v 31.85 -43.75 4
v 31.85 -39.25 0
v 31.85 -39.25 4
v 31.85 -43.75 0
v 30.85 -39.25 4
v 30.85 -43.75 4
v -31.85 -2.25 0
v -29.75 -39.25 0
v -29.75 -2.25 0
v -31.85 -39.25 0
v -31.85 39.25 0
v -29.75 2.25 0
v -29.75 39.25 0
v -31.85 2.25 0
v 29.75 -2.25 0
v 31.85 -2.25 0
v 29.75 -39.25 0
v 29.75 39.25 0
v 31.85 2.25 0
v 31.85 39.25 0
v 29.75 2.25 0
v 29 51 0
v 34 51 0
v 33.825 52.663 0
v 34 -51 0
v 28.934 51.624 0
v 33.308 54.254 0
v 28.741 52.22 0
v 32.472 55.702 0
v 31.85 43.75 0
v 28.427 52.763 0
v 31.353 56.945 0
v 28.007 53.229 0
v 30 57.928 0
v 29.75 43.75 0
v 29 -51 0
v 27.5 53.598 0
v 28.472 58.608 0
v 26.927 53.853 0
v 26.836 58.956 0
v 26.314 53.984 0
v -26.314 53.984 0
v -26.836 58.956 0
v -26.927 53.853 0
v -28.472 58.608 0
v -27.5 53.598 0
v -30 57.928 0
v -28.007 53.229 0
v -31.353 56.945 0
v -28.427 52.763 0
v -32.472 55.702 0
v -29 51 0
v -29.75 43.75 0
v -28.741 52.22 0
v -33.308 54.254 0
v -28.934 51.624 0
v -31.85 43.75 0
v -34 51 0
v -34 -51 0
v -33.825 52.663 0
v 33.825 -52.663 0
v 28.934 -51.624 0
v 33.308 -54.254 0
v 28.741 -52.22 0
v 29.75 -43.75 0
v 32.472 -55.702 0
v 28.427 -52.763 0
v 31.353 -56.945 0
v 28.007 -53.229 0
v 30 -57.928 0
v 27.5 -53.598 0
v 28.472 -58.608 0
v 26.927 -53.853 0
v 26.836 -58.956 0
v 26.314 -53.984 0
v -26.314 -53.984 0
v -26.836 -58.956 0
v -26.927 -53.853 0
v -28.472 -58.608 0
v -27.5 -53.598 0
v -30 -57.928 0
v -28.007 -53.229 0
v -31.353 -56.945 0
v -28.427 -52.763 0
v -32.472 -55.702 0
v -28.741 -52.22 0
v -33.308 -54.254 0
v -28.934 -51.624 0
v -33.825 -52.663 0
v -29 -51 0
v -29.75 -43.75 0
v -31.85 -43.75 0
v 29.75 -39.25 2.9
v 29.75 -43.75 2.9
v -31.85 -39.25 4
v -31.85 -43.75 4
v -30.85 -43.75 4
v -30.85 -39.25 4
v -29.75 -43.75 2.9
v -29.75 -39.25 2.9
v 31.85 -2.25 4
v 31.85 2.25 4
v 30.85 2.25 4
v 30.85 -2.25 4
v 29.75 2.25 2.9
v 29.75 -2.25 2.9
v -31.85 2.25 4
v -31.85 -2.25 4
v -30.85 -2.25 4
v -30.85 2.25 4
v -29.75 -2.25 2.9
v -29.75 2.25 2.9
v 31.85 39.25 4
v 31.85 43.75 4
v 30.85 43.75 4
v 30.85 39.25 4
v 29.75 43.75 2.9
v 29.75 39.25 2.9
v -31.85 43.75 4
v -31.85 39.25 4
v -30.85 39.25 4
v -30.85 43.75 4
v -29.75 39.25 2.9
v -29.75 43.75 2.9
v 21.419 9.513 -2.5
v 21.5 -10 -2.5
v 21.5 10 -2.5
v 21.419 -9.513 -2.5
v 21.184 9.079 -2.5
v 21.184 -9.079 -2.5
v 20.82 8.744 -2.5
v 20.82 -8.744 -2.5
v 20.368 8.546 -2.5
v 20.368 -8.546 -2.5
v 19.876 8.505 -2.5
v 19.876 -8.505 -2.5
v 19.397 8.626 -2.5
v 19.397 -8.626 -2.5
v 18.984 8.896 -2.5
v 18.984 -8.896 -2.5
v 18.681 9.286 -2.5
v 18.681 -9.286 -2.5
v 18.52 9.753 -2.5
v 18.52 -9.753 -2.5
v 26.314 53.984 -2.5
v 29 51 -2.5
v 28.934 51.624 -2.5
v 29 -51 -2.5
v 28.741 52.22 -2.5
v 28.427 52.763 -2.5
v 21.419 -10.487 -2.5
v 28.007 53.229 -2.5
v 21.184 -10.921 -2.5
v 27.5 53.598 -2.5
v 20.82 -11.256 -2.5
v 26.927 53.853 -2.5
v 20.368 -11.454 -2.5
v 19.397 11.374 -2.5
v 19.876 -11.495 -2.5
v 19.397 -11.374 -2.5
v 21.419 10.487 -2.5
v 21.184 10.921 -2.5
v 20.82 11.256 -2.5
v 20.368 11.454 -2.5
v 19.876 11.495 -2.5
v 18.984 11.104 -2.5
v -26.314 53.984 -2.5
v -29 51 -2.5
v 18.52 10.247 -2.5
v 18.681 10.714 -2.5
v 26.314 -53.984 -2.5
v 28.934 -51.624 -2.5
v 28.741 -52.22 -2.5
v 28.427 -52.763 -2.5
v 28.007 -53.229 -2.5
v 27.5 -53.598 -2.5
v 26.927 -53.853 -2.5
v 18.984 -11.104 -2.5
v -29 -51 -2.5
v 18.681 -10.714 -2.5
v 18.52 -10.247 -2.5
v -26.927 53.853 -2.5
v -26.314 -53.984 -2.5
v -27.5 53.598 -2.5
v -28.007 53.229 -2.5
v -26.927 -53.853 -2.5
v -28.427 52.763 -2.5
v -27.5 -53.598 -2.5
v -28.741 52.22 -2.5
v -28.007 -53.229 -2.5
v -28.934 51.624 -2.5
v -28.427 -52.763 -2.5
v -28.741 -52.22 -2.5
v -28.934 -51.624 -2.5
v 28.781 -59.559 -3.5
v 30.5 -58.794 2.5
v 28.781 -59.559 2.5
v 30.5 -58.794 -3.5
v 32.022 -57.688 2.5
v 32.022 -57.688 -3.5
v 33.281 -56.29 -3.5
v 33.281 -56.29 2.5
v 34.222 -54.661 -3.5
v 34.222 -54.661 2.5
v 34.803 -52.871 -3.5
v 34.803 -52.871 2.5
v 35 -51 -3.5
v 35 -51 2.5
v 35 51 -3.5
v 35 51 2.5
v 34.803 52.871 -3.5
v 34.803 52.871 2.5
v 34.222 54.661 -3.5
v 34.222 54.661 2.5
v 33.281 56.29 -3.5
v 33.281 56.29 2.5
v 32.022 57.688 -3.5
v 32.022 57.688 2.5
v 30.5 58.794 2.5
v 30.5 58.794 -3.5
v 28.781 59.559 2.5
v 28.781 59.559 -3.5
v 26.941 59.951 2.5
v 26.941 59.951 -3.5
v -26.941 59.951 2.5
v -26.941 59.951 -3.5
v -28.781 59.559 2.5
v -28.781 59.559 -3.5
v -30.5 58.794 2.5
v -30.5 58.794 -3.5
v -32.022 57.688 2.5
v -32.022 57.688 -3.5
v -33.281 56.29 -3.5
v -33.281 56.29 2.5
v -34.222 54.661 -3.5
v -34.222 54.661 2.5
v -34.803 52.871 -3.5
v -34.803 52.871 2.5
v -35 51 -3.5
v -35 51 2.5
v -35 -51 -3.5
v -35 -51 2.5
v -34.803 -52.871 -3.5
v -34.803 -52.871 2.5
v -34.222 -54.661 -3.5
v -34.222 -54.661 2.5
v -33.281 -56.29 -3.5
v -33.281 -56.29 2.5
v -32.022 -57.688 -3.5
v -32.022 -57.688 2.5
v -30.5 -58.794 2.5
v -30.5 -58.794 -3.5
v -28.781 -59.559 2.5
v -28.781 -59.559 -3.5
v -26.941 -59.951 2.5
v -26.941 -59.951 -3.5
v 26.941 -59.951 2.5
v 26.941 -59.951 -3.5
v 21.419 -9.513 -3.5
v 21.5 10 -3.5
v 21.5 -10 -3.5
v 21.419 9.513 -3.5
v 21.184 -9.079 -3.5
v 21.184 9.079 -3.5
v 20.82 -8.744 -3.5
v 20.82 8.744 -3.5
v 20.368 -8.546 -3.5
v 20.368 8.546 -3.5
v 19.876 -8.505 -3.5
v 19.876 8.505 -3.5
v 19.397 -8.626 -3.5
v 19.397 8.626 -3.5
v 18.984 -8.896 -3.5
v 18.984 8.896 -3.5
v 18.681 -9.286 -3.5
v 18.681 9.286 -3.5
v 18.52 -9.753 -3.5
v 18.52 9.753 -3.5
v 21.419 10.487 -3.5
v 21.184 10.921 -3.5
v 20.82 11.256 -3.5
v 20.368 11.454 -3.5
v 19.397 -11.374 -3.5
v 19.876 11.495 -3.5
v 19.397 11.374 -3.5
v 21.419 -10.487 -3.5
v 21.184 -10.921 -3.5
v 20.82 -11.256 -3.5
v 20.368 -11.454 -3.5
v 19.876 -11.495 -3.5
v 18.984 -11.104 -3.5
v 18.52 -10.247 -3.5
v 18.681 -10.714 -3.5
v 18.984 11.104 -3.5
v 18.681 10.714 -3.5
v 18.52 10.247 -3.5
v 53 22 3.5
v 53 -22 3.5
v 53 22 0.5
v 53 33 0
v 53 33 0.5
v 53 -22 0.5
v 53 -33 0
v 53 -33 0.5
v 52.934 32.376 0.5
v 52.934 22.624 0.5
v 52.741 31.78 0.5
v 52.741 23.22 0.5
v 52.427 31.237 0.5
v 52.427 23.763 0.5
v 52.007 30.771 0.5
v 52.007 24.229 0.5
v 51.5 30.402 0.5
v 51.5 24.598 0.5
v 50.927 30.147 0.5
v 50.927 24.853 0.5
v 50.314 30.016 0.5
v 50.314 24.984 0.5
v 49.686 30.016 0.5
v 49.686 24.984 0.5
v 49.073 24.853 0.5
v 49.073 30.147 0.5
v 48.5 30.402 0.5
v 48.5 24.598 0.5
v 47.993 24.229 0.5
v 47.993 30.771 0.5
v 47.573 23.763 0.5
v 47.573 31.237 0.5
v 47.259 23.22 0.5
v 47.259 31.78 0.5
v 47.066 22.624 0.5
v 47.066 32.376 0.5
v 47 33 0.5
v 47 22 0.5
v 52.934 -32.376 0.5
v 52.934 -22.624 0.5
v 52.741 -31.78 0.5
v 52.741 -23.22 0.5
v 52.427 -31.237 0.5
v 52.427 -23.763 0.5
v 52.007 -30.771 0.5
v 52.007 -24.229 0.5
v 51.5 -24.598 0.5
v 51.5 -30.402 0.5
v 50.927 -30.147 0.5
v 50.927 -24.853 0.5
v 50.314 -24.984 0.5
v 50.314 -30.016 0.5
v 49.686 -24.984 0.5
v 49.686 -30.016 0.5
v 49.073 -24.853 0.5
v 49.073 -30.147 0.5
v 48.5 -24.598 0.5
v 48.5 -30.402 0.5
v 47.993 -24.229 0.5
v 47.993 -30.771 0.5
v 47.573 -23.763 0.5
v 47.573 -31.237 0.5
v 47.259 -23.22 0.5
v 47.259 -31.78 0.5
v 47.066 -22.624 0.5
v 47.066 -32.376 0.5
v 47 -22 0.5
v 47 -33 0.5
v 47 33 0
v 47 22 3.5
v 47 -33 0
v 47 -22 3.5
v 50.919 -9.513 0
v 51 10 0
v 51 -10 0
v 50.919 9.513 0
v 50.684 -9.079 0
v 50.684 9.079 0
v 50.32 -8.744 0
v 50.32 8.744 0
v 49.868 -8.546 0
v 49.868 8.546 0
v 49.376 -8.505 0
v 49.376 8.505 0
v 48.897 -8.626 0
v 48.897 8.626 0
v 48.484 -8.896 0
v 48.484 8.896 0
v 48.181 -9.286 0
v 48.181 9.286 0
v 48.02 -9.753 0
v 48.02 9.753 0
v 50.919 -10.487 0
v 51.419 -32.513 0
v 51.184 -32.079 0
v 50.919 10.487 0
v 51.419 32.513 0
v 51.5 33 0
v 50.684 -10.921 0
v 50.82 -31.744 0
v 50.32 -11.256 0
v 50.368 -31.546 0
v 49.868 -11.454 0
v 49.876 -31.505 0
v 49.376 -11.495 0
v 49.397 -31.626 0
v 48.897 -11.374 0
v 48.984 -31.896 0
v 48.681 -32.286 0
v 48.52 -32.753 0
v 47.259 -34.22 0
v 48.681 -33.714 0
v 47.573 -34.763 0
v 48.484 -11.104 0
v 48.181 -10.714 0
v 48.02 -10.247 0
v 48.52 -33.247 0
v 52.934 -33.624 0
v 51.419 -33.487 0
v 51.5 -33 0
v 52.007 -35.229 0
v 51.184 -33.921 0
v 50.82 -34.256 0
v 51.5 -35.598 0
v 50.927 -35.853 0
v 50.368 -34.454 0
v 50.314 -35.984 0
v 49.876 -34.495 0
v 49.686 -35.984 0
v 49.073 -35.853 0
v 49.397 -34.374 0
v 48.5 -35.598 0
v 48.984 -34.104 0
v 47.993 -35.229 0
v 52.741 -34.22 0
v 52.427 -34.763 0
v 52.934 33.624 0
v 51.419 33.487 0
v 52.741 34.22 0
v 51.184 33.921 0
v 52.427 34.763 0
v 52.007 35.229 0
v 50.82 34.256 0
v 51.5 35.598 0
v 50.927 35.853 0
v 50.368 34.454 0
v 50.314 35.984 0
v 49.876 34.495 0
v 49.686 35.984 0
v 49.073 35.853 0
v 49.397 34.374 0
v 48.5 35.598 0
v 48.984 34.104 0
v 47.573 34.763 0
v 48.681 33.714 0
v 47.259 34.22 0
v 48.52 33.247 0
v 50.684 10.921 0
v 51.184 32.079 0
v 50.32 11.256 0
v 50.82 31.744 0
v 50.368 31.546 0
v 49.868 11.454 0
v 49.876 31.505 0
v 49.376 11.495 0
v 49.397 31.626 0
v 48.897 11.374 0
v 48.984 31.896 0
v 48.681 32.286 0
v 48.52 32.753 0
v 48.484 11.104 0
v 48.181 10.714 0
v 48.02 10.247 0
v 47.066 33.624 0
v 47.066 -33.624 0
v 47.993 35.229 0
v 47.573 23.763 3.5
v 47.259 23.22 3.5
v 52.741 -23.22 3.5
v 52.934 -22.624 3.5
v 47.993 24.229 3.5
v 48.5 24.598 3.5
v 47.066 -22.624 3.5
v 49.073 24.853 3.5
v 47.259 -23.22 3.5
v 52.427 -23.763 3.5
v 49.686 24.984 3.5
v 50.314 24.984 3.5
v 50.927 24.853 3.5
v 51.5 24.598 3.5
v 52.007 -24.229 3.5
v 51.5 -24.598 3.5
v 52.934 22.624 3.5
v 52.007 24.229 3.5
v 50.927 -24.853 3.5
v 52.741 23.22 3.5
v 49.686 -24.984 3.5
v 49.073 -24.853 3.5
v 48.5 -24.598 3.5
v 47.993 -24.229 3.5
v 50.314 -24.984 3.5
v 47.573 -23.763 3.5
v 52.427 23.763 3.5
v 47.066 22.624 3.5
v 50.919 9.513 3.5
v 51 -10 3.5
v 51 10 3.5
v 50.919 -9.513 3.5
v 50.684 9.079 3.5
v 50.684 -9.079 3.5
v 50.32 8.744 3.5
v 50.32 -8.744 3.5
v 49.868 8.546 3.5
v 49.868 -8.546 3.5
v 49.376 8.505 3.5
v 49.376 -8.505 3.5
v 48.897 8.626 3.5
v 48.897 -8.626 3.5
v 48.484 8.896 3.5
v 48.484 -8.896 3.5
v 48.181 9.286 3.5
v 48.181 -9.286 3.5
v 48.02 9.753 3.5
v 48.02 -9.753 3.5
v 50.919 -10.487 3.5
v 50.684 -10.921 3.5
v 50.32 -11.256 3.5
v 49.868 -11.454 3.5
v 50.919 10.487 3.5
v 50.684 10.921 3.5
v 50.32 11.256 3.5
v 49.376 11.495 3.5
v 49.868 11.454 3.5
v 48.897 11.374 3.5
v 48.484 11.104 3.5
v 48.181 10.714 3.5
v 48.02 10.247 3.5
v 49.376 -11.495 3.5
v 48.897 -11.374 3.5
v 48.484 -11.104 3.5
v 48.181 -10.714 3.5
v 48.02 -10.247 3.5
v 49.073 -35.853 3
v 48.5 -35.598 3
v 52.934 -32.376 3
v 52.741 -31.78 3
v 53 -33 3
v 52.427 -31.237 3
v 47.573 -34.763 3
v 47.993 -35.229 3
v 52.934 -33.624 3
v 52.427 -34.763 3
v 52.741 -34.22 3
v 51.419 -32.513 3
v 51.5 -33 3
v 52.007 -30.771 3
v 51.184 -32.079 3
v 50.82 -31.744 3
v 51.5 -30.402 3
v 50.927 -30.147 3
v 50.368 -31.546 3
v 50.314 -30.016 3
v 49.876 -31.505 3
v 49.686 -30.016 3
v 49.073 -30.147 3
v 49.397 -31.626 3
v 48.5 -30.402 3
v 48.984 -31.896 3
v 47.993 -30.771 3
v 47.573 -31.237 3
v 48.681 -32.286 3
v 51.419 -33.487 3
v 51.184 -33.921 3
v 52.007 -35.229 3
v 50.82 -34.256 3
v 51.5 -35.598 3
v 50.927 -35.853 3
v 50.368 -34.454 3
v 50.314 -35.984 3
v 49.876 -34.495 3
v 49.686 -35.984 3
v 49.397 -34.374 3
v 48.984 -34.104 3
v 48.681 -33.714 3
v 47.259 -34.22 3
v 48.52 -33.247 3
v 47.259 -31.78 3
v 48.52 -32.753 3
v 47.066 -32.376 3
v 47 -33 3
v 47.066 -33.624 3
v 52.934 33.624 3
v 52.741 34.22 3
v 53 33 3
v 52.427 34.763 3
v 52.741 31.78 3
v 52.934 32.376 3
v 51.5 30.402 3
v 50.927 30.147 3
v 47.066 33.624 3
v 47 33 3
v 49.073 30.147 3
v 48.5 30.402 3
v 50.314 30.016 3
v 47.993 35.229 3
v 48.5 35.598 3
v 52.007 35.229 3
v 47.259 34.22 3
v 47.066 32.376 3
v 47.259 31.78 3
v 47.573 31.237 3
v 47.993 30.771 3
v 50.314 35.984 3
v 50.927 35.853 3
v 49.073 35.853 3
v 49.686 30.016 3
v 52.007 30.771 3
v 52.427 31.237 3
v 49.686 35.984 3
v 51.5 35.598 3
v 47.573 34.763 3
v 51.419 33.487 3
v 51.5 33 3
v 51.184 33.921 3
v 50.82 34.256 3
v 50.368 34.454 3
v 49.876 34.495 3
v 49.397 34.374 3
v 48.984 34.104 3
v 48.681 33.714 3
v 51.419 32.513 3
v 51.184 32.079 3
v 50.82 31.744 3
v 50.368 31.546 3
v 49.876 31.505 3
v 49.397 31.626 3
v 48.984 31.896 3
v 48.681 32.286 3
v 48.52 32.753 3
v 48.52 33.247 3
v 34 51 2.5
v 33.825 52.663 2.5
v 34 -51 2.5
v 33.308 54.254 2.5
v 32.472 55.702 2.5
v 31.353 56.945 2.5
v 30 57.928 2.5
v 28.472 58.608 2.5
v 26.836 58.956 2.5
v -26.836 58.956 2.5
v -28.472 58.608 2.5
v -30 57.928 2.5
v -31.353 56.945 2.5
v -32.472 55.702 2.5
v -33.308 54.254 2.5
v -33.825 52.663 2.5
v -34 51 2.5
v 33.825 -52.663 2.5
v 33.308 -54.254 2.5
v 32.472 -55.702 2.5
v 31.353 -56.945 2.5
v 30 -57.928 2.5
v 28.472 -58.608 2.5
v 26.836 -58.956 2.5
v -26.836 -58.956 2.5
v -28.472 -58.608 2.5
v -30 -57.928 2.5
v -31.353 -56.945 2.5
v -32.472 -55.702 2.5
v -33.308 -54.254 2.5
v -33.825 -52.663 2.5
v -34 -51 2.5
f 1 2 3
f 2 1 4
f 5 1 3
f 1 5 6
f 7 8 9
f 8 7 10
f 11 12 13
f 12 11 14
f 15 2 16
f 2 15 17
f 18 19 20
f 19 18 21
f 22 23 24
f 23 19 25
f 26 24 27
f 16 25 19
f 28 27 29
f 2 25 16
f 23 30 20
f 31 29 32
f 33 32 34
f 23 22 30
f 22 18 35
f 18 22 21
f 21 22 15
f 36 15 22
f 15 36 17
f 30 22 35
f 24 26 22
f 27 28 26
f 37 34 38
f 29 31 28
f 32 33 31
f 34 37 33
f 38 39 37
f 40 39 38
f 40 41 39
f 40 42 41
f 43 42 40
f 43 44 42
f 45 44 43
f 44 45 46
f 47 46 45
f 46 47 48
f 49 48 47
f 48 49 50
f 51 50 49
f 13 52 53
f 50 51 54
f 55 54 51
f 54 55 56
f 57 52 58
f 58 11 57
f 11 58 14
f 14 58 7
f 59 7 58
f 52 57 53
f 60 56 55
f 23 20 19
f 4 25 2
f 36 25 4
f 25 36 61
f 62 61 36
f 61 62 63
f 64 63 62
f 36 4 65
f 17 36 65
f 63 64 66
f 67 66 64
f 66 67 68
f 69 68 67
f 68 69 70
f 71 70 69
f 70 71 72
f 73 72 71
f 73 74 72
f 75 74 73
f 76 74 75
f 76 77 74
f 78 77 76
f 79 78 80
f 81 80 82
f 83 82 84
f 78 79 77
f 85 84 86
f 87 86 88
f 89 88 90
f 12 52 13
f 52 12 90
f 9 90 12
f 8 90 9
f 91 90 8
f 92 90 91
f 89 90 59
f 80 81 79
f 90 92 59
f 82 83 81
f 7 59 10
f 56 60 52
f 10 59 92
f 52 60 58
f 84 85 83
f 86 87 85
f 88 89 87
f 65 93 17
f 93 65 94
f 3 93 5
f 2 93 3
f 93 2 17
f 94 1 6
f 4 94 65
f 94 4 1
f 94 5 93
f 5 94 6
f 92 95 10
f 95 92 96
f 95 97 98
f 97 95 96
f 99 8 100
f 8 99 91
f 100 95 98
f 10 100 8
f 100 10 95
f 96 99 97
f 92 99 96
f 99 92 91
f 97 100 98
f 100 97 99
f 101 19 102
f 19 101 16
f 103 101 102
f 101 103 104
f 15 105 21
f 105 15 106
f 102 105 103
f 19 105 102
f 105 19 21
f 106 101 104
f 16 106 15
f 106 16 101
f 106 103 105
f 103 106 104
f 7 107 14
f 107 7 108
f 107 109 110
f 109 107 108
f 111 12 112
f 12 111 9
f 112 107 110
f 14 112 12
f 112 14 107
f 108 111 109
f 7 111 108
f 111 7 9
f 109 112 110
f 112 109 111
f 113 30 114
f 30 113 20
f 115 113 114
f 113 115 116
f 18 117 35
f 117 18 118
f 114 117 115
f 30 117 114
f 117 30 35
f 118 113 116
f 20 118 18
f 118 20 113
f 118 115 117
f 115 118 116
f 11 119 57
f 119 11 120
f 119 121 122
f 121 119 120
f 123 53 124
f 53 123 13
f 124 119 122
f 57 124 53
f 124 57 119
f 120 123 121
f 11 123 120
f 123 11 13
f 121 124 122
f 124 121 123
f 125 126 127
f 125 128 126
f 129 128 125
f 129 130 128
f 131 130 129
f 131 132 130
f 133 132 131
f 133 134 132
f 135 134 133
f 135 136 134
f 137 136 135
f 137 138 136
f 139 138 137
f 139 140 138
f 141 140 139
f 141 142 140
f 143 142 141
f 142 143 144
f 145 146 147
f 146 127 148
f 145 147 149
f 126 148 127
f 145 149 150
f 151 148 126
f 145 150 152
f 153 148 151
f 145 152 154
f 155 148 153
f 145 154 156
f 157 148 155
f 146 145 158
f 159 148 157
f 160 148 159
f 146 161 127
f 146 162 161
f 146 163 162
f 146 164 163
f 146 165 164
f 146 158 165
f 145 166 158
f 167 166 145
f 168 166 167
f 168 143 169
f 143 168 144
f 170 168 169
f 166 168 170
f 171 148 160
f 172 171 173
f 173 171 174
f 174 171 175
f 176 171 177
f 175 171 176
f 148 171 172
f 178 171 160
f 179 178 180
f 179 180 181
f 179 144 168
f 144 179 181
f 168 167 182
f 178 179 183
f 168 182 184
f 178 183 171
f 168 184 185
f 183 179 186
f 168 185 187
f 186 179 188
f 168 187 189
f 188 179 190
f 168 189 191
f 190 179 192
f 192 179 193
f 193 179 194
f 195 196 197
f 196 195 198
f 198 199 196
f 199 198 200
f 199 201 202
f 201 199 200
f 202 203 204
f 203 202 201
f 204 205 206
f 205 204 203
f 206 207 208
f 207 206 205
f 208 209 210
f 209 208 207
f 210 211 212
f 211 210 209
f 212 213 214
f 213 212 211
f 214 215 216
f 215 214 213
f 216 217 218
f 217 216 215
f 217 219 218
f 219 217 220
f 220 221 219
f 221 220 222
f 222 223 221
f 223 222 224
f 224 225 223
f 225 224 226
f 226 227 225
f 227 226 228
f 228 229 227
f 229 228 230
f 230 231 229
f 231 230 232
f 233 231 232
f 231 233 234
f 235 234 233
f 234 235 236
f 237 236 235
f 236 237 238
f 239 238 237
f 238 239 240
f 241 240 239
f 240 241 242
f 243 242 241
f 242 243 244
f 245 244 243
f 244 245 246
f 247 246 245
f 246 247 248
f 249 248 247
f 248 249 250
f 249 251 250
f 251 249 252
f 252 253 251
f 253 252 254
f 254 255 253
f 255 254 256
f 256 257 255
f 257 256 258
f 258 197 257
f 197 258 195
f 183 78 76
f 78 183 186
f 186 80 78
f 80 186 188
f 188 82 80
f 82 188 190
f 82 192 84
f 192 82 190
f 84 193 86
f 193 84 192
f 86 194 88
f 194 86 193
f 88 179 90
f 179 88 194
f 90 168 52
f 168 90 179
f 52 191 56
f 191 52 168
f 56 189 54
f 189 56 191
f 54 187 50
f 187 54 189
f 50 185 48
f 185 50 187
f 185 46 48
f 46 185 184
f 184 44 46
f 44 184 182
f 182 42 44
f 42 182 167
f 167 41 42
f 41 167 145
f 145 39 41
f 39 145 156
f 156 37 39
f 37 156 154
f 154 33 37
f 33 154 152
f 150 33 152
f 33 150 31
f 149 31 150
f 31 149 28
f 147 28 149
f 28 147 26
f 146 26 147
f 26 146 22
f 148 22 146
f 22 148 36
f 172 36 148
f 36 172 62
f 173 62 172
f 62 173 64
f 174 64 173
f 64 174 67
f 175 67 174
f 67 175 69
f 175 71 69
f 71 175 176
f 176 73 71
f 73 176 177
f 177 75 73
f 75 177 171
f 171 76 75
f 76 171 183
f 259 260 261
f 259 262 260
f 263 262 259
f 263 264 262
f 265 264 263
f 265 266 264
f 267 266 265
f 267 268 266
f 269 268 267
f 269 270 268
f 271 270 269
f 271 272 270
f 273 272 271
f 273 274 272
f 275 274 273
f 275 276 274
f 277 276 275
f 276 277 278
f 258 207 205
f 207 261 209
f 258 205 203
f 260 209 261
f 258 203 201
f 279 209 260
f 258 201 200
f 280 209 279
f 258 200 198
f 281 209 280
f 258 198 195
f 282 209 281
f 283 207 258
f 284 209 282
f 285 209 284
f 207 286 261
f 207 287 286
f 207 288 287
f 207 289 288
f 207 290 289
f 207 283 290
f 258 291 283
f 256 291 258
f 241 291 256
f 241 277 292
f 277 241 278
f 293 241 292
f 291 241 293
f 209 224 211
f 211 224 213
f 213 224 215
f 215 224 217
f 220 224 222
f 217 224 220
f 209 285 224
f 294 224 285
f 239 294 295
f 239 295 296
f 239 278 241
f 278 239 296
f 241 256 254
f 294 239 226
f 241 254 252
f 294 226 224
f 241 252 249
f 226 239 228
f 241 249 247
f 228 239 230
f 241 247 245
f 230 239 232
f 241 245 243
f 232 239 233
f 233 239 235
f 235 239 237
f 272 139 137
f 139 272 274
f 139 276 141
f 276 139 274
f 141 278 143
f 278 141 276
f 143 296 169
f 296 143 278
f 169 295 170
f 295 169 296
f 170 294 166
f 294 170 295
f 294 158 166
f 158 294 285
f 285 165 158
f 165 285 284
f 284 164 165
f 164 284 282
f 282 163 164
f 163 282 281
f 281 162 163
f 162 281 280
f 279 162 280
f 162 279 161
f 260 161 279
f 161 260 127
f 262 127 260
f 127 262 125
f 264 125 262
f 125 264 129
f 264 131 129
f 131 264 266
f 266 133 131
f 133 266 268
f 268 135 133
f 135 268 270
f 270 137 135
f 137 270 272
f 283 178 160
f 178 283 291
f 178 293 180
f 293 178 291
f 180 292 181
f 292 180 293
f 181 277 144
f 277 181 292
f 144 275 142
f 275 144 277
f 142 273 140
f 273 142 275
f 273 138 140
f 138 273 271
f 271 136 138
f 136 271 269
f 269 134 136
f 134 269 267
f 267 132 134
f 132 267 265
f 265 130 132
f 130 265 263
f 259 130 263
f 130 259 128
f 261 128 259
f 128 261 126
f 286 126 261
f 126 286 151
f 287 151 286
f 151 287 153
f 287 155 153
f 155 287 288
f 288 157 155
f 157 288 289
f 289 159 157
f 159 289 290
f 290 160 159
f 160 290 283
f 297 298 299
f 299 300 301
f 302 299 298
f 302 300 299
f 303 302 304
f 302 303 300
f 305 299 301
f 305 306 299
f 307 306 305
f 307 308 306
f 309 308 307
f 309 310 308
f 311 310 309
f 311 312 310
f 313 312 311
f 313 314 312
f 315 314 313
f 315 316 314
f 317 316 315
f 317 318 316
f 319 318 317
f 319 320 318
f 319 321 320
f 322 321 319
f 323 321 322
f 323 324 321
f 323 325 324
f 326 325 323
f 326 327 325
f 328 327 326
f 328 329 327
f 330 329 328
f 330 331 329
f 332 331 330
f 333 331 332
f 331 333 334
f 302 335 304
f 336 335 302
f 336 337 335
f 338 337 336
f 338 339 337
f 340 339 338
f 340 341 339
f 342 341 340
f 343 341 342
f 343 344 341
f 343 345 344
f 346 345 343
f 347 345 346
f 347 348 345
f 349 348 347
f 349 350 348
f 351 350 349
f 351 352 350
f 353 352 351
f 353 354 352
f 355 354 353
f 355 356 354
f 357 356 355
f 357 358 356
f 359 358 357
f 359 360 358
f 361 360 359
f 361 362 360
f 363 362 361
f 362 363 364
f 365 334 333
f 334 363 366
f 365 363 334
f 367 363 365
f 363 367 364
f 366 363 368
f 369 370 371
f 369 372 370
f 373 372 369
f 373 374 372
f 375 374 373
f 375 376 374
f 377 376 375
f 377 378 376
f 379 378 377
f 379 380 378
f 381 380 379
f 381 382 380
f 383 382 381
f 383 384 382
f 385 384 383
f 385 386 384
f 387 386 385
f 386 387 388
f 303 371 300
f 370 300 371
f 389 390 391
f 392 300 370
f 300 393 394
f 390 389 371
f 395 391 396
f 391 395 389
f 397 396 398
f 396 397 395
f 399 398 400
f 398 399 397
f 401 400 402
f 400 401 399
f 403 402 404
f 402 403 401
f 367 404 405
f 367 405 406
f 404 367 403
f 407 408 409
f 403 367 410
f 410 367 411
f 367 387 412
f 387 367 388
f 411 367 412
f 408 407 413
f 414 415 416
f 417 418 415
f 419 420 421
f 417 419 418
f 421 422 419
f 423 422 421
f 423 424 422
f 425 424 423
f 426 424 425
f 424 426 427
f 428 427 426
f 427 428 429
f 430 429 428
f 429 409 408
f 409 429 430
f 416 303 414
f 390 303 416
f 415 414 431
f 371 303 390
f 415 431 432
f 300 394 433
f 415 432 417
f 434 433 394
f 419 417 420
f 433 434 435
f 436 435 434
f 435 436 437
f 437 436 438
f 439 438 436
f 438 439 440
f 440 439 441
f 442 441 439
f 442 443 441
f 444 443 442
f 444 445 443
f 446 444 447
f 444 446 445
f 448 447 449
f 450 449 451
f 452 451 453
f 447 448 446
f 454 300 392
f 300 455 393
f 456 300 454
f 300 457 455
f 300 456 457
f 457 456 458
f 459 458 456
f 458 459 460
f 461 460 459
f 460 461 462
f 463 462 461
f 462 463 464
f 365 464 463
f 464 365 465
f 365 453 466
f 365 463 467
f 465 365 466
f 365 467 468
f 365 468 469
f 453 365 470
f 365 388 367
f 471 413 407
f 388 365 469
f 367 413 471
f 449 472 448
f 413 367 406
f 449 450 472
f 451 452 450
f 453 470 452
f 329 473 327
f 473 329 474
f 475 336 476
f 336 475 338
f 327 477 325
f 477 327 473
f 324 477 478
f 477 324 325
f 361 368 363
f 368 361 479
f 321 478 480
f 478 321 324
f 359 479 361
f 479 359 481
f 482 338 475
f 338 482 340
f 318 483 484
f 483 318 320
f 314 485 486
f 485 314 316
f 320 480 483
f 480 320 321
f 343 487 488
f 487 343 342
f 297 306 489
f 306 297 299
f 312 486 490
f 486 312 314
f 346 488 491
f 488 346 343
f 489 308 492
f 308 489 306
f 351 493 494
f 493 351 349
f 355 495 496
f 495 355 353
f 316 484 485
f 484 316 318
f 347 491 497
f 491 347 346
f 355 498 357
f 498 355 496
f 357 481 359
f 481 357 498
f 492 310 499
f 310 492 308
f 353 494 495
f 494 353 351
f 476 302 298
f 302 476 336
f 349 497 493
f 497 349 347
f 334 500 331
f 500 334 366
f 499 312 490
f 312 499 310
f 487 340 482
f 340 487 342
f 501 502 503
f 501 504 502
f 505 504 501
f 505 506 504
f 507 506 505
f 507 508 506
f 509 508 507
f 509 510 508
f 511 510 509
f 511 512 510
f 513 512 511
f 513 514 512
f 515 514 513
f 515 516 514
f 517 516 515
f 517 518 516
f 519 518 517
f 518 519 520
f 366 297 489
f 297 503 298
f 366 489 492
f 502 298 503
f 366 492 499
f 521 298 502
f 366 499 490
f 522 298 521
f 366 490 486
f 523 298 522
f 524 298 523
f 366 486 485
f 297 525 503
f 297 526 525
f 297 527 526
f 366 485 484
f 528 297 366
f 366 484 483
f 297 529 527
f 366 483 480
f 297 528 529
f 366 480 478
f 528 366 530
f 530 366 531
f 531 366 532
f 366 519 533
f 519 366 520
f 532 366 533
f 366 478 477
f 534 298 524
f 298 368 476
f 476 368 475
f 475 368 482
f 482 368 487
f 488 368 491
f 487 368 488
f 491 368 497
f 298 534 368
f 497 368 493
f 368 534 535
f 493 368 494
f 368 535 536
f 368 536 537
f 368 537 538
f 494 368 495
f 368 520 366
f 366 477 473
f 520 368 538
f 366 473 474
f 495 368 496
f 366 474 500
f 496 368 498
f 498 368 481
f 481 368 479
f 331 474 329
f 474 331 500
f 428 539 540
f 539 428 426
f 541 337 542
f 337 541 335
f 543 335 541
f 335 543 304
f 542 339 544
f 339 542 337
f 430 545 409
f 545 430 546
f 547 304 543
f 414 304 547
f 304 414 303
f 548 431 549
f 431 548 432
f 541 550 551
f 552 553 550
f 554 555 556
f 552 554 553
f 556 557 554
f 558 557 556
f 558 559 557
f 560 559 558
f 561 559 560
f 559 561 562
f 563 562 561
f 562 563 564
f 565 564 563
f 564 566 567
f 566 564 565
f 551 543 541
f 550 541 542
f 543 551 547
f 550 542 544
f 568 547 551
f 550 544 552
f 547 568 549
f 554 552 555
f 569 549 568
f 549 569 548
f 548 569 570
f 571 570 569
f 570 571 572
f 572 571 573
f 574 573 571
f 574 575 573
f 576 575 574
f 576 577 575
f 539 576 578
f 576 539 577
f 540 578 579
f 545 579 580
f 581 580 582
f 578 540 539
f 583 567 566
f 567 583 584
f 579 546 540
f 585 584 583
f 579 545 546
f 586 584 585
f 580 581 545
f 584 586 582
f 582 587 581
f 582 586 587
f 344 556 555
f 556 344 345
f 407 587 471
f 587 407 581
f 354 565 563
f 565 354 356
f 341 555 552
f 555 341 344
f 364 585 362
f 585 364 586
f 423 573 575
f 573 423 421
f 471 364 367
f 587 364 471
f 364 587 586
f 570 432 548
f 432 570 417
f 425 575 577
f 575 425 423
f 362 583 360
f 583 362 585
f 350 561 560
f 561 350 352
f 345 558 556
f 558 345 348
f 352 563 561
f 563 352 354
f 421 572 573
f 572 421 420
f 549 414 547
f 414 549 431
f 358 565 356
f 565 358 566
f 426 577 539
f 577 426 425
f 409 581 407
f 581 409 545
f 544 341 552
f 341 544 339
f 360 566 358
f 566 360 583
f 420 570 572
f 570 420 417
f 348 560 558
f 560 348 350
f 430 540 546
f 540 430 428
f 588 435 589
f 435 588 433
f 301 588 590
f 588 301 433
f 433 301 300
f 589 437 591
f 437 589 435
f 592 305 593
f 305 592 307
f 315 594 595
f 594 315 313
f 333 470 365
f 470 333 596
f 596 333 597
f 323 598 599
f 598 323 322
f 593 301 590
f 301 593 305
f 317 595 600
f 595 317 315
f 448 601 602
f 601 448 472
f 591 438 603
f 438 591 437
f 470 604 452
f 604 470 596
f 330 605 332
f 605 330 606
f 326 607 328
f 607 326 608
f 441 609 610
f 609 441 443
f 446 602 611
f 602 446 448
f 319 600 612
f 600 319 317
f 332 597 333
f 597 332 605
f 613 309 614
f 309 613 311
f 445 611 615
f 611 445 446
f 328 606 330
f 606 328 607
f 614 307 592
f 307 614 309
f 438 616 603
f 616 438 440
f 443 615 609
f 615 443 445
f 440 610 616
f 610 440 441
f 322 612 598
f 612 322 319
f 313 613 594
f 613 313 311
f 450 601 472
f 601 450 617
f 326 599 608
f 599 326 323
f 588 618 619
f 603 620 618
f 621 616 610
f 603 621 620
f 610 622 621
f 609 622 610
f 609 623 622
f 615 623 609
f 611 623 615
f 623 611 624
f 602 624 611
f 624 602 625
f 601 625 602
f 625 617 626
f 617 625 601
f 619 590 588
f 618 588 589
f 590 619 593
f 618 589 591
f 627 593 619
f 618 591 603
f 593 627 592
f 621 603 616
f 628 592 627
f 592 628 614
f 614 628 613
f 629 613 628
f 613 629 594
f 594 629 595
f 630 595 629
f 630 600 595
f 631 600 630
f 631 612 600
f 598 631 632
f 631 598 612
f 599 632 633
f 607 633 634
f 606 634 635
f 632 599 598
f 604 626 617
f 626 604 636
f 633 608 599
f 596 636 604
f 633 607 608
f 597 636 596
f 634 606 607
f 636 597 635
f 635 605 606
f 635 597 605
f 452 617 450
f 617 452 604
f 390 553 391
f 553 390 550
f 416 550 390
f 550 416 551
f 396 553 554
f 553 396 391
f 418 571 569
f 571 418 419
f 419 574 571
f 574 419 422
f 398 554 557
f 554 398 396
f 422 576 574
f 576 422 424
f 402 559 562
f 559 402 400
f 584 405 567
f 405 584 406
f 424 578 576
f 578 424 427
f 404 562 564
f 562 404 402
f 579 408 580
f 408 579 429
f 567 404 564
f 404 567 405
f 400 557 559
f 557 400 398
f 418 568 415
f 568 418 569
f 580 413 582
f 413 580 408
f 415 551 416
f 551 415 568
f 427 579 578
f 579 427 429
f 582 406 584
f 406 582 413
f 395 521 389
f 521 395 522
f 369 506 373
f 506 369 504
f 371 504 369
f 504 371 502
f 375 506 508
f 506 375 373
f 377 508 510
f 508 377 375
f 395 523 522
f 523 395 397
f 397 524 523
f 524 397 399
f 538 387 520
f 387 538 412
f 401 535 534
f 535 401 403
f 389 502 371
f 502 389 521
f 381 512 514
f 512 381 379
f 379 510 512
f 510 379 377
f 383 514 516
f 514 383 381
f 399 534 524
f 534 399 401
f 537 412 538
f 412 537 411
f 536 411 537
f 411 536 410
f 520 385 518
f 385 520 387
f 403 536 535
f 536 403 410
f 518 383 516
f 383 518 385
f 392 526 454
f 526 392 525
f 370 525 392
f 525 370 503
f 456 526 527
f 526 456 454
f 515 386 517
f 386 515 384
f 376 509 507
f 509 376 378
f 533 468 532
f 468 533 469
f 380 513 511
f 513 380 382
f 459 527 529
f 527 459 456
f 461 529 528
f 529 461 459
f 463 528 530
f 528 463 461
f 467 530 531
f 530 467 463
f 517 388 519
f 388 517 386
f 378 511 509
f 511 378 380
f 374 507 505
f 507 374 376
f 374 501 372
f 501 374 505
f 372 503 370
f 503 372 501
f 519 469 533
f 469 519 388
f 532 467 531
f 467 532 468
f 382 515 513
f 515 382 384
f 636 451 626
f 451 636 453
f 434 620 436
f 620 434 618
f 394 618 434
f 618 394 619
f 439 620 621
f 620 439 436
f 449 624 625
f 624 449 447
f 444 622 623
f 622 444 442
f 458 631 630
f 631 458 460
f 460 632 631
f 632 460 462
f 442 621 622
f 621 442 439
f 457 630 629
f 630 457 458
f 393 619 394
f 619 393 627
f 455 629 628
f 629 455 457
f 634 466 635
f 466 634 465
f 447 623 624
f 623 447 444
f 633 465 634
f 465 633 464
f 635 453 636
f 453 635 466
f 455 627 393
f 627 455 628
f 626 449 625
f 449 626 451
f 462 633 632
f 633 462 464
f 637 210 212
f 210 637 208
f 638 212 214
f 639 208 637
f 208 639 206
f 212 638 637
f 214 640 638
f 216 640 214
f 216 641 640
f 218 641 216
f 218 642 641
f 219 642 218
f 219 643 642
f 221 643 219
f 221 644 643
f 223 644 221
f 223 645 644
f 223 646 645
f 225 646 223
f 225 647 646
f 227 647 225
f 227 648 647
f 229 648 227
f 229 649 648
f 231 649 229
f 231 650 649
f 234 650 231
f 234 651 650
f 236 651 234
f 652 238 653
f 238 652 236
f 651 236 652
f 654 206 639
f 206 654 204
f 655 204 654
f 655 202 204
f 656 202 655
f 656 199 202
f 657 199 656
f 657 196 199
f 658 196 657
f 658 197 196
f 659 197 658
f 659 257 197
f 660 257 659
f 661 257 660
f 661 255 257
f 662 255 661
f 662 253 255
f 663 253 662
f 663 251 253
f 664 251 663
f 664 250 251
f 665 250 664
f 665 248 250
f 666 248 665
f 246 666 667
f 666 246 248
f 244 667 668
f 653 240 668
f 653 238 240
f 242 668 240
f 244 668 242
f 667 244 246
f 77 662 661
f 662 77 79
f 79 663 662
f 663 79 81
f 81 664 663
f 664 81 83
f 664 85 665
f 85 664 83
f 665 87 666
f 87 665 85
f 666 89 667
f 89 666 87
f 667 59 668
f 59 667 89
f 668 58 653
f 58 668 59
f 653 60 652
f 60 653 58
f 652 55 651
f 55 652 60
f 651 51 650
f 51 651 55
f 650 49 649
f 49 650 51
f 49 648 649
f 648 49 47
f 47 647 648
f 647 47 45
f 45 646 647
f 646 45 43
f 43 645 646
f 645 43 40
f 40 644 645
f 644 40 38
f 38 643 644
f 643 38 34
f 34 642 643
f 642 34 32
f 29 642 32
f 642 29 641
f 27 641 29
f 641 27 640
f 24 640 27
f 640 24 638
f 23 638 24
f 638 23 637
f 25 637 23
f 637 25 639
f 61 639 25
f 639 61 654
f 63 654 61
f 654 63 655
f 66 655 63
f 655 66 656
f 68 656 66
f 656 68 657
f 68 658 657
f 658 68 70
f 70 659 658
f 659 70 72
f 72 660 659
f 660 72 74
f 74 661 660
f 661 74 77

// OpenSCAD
$fs=.5;

module rsq(wh,r){
	minkowski(){square([wh[0]-r*2,wh[1]-r*2],center=true);circle(r);}
}

module tume(){
	translate([59.5/2,-4.5/2,0])difference(){
		cube([2.1,4.5,4]);
		translate([1.1,(4.5-5)/2,4])rotate([0,-90-45,0])cube([2,5,4]);
	}
}

linear_extrude(2.5)difference(){
	rsq([70,120],9);
	rsq([70-2,120-2],9-1);
}
for(i=[-1:1])translate([0,i*41.5,0]){
	tume();scale([-1,1,1])tume();
}
translate([0,0,-2.5]){
	linear_extrude(2.5)difference(){
		rsq([70,120],9);
		rsq([70-12,120-12],9-6);
	}
	translate([0,0,-1]){
		linear_extrude(1)difference(){
			rsq([70,120],9);
			//square([43.5,92],center=true);
			for(i=[-1,1])translate([20, 10*i,0])circle(d=3);
		}
	}
}


translate([50,0,0])difference(){
	union(){
		linear_extrude(.5)minkowski(){square([1e-9,66],center=true);circle(d=6);}
		linear_extrude(3.5)minkowski(){square([1e-9,44],center=true);circle(d=6);}
		translate([0,-33,0])cylinder(d=6,h=3);
		//translate([-.5,-10,0])cylinder(d=6,h=3.5);
		//translate([-.5,10,0])cylinder(d=6,h=3.5);
		translate([0,33,0])cylinder(d=6,h=3);
	}
	translate([0,-33,0])cylinder(d=3,h=5);
	translate([-.5,-10,0])cylinder(d=3,h=5);
	translate([-.5,10,0])cylinder(d=3,h=5);
	translate([0,33,0])cylinder(d=3,h=5);
}
